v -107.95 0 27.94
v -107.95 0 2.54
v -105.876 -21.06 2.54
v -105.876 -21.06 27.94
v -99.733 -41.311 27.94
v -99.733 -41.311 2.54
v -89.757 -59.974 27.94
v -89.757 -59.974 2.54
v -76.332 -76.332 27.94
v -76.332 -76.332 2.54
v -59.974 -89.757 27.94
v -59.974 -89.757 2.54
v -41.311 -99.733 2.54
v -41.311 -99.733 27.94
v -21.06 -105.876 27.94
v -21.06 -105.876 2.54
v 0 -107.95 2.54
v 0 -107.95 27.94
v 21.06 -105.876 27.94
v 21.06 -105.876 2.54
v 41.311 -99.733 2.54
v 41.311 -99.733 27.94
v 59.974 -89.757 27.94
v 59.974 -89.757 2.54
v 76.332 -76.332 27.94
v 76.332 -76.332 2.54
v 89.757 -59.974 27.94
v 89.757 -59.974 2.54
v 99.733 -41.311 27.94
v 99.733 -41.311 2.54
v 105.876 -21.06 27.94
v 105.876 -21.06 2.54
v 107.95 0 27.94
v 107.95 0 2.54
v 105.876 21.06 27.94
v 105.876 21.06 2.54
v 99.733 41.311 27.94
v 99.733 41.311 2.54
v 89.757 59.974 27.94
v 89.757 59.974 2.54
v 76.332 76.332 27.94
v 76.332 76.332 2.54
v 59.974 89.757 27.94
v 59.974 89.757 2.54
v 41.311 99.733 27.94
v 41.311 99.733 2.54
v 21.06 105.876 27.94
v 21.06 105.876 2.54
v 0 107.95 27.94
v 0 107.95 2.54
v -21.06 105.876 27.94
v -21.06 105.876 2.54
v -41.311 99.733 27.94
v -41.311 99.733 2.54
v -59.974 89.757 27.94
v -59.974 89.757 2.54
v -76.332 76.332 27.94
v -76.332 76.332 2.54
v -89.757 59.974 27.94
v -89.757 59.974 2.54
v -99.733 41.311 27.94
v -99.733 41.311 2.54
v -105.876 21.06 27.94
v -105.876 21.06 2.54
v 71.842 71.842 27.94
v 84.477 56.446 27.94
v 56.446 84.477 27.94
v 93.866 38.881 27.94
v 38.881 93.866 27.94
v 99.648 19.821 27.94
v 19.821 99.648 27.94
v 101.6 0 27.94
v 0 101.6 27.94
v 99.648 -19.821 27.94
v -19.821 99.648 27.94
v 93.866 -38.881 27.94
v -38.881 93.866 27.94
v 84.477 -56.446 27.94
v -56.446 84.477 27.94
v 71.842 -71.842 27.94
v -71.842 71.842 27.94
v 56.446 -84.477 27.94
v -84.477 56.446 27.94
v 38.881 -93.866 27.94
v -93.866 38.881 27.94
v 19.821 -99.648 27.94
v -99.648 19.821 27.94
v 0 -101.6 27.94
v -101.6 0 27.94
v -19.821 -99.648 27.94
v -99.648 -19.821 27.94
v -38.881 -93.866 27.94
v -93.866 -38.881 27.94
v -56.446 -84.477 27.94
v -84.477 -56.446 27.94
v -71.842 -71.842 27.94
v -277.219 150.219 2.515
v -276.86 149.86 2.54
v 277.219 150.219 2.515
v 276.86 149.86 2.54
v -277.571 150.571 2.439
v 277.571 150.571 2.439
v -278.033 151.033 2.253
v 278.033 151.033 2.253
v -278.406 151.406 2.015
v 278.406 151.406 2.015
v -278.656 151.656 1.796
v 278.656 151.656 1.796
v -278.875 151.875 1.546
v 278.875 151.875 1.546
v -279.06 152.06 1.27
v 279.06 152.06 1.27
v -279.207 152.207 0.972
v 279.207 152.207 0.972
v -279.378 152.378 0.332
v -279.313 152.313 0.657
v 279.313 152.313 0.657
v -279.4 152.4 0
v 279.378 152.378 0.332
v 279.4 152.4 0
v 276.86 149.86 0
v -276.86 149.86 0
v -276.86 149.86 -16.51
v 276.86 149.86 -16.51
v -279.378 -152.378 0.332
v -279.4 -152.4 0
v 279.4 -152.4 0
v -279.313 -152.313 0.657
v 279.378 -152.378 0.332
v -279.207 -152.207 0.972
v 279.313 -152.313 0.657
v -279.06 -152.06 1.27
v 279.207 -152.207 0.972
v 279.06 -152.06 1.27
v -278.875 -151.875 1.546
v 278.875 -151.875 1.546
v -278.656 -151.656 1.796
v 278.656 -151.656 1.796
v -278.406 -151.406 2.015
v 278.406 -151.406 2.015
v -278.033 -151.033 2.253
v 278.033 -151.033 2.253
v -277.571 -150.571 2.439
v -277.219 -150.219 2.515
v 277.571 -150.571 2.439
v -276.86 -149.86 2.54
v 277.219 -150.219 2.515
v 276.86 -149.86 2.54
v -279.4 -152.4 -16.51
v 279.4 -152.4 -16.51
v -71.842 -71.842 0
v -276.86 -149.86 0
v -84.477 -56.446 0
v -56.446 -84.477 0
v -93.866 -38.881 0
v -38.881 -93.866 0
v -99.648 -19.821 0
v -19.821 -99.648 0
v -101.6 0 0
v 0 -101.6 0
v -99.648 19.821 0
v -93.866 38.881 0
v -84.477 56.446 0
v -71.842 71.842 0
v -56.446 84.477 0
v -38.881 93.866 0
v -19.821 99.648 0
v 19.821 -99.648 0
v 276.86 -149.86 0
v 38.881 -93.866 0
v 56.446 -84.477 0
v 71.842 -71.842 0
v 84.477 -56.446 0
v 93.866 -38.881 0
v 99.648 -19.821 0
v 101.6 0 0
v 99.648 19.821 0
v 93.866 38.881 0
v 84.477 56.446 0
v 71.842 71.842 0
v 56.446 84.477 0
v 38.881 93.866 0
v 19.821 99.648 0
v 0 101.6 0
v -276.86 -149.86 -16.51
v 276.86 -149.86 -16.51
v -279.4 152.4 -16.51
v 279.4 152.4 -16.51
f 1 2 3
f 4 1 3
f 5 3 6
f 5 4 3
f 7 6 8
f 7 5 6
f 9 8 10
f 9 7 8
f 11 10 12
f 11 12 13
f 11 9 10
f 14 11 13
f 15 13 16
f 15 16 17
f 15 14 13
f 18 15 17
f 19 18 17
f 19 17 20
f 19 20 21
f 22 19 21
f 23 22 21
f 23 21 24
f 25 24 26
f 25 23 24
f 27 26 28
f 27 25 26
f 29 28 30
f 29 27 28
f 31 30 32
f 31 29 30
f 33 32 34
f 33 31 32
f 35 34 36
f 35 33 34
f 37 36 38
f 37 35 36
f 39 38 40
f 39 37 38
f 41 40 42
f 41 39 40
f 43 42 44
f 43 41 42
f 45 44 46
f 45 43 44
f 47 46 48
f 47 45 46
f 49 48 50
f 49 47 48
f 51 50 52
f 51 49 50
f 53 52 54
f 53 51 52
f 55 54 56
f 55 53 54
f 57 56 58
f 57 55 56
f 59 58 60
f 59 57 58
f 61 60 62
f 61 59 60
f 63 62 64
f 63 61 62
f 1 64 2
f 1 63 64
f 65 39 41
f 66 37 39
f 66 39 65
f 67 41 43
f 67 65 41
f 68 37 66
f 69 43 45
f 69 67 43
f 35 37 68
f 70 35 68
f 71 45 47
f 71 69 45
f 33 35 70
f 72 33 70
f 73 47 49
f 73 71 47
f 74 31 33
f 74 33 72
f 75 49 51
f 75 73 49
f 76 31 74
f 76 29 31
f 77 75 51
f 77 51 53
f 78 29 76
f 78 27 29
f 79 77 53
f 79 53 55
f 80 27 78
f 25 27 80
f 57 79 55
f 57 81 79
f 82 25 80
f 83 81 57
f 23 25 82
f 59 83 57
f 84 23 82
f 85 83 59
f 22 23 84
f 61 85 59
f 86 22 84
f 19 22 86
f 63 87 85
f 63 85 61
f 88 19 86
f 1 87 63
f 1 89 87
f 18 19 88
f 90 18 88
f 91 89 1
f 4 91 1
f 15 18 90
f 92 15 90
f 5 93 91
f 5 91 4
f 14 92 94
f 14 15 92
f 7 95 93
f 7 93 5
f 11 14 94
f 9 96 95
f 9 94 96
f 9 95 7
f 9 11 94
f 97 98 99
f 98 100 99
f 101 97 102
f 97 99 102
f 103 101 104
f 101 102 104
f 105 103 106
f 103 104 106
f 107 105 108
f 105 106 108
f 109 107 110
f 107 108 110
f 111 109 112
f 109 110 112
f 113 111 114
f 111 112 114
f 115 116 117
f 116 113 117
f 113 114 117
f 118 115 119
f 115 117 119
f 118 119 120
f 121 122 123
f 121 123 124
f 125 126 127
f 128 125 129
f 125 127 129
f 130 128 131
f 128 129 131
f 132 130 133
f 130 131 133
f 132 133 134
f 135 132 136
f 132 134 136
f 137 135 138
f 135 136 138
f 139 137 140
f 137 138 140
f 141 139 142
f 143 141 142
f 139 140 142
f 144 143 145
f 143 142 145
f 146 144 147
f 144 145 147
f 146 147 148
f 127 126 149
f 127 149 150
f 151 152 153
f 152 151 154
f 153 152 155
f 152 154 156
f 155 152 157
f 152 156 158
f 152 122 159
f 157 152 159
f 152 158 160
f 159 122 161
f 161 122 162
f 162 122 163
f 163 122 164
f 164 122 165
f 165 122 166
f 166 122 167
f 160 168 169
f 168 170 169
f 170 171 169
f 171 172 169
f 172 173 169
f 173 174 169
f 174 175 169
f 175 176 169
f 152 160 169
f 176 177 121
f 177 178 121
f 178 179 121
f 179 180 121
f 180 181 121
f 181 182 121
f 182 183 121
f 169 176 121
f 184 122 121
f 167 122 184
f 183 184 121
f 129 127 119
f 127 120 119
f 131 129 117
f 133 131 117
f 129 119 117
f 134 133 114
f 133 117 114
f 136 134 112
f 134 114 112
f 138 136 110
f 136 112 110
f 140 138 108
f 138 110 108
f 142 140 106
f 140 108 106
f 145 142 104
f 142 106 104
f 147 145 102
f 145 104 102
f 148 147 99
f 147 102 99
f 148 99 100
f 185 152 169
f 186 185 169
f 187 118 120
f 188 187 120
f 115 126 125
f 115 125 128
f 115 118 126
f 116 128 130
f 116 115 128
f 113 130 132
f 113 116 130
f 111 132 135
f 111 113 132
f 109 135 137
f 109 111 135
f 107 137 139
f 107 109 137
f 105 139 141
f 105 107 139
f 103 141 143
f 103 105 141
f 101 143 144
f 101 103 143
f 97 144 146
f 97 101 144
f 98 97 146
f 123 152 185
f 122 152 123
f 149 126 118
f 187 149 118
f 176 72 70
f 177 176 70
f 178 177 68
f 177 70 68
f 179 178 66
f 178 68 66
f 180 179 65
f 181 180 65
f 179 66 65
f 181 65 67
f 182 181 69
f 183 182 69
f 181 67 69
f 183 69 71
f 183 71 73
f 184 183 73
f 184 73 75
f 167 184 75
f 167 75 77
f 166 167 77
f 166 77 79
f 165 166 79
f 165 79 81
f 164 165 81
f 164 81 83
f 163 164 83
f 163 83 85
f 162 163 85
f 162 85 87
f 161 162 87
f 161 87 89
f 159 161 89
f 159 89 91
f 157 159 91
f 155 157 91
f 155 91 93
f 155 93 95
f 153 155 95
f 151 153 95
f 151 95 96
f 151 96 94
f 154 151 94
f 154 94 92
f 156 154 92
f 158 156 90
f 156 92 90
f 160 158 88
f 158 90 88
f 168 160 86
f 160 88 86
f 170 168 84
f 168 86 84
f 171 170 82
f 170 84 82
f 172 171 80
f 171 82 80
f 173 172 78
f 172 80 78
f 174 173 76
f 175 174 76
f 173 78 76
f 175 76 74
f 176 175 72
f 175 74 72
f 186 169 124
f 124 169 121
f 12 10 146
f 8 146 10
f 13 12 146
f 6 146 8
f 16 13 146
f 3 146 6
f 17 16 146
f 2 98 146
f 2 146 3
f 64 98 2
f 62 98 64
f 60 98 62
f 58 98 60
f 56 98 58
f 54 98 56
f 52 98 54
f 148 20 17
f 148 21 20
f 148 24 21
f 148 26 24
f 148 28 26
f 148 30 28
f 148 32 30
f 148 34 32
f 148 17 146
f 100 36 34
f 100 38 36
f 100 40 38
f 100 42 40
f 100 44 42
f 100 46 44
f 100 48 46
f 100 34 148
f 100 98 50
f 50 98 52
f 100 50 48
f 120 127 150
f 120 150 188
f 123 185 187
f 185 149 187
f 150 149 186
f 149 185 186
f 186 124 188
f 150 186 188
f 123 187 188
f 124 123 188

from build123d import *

# Parameters (mm, degrees)
SKETCH1_W           = 558.8
SKETCH1_H           = 304.8
BOSS_EXTRUDE1_DEPTH = 2.54
SKETCH2_W           = 558.8
SKETCH2_H           = 304.8
SKETCH2_W_2         = 553.72
SKETCH2_H_2         = 299.72
BOSS_EXTRUDE2_DEPTH = 19.05
FILLET1_R           = 2.54
SKETCH4_R           = 101.6
CUT_EXTRUDE2_DEPTH  = 19.05
BOSS_EXTRUDE3_START = 25.4
SKETCH5_R           = 107.95
SKETCH5_R_2         = 101.6
BOSS_EXTRUDE3_DEPTH = 25.4


with BuildPart() as part:
    # Sketch1 → Boss-Extrude1 (new body)
    with BuildSketch(Plane.XY):
        Rectangle(SKETCH1_W, SKETCH1_H)
    extrude(amount=BOSS_EXTRUDE1_DEPTH)

    # Sketch2 → Boss-Extrude2 (add)
    with BuildSketch(Plane.XY.offset(2.54)):
        Rectangle(SKETCH2_W, SKETCH2_H)
        Rectangle(SKETCH2_W_2, SKETCH2_H_2, mode=Mode.SUBTRACT)
    extrude(amount=-BOSS_EXTRUDE2_DEPTH)

    # Fillet1
    fillet1_edges = [part.edges().sort_by_distance(p)[0] for p in [
        (-279.4, 0, 2.54),
        (0, -152.4, 2.54),
        (279.4, 0, 2.54),
        (0, 152.4, 2.54),
    ]]
    fillet(fillet1_edges, radius=FILLET1_R)

    # Sketch4 → Cut-Extrude2 (cut)
    with BuildSketch(Plane.XY.offset(2.54)):
        Circle(SKETCH4_R)
    extrude(amount=-CUT_EXTRUDE2_DEPTH, mode=Mode.SUBTRACT)

    # Sketch5 → Boss-Extrude3 (add)
    with BuildSketch(Plane.XY.offset(2.54).offset(BOSS_EXTRUDE3_START)):
        with Locations(Location((0, 0, 0), (0, 0, 180))):
            Circle(SKETCH5_R)
        Circle(SKETCH5_R_2, mode=Mode.SUBTRACT)
    extrude(amount=-BOSS_EXTRUDE3_DEPTH)


solid = part.part
